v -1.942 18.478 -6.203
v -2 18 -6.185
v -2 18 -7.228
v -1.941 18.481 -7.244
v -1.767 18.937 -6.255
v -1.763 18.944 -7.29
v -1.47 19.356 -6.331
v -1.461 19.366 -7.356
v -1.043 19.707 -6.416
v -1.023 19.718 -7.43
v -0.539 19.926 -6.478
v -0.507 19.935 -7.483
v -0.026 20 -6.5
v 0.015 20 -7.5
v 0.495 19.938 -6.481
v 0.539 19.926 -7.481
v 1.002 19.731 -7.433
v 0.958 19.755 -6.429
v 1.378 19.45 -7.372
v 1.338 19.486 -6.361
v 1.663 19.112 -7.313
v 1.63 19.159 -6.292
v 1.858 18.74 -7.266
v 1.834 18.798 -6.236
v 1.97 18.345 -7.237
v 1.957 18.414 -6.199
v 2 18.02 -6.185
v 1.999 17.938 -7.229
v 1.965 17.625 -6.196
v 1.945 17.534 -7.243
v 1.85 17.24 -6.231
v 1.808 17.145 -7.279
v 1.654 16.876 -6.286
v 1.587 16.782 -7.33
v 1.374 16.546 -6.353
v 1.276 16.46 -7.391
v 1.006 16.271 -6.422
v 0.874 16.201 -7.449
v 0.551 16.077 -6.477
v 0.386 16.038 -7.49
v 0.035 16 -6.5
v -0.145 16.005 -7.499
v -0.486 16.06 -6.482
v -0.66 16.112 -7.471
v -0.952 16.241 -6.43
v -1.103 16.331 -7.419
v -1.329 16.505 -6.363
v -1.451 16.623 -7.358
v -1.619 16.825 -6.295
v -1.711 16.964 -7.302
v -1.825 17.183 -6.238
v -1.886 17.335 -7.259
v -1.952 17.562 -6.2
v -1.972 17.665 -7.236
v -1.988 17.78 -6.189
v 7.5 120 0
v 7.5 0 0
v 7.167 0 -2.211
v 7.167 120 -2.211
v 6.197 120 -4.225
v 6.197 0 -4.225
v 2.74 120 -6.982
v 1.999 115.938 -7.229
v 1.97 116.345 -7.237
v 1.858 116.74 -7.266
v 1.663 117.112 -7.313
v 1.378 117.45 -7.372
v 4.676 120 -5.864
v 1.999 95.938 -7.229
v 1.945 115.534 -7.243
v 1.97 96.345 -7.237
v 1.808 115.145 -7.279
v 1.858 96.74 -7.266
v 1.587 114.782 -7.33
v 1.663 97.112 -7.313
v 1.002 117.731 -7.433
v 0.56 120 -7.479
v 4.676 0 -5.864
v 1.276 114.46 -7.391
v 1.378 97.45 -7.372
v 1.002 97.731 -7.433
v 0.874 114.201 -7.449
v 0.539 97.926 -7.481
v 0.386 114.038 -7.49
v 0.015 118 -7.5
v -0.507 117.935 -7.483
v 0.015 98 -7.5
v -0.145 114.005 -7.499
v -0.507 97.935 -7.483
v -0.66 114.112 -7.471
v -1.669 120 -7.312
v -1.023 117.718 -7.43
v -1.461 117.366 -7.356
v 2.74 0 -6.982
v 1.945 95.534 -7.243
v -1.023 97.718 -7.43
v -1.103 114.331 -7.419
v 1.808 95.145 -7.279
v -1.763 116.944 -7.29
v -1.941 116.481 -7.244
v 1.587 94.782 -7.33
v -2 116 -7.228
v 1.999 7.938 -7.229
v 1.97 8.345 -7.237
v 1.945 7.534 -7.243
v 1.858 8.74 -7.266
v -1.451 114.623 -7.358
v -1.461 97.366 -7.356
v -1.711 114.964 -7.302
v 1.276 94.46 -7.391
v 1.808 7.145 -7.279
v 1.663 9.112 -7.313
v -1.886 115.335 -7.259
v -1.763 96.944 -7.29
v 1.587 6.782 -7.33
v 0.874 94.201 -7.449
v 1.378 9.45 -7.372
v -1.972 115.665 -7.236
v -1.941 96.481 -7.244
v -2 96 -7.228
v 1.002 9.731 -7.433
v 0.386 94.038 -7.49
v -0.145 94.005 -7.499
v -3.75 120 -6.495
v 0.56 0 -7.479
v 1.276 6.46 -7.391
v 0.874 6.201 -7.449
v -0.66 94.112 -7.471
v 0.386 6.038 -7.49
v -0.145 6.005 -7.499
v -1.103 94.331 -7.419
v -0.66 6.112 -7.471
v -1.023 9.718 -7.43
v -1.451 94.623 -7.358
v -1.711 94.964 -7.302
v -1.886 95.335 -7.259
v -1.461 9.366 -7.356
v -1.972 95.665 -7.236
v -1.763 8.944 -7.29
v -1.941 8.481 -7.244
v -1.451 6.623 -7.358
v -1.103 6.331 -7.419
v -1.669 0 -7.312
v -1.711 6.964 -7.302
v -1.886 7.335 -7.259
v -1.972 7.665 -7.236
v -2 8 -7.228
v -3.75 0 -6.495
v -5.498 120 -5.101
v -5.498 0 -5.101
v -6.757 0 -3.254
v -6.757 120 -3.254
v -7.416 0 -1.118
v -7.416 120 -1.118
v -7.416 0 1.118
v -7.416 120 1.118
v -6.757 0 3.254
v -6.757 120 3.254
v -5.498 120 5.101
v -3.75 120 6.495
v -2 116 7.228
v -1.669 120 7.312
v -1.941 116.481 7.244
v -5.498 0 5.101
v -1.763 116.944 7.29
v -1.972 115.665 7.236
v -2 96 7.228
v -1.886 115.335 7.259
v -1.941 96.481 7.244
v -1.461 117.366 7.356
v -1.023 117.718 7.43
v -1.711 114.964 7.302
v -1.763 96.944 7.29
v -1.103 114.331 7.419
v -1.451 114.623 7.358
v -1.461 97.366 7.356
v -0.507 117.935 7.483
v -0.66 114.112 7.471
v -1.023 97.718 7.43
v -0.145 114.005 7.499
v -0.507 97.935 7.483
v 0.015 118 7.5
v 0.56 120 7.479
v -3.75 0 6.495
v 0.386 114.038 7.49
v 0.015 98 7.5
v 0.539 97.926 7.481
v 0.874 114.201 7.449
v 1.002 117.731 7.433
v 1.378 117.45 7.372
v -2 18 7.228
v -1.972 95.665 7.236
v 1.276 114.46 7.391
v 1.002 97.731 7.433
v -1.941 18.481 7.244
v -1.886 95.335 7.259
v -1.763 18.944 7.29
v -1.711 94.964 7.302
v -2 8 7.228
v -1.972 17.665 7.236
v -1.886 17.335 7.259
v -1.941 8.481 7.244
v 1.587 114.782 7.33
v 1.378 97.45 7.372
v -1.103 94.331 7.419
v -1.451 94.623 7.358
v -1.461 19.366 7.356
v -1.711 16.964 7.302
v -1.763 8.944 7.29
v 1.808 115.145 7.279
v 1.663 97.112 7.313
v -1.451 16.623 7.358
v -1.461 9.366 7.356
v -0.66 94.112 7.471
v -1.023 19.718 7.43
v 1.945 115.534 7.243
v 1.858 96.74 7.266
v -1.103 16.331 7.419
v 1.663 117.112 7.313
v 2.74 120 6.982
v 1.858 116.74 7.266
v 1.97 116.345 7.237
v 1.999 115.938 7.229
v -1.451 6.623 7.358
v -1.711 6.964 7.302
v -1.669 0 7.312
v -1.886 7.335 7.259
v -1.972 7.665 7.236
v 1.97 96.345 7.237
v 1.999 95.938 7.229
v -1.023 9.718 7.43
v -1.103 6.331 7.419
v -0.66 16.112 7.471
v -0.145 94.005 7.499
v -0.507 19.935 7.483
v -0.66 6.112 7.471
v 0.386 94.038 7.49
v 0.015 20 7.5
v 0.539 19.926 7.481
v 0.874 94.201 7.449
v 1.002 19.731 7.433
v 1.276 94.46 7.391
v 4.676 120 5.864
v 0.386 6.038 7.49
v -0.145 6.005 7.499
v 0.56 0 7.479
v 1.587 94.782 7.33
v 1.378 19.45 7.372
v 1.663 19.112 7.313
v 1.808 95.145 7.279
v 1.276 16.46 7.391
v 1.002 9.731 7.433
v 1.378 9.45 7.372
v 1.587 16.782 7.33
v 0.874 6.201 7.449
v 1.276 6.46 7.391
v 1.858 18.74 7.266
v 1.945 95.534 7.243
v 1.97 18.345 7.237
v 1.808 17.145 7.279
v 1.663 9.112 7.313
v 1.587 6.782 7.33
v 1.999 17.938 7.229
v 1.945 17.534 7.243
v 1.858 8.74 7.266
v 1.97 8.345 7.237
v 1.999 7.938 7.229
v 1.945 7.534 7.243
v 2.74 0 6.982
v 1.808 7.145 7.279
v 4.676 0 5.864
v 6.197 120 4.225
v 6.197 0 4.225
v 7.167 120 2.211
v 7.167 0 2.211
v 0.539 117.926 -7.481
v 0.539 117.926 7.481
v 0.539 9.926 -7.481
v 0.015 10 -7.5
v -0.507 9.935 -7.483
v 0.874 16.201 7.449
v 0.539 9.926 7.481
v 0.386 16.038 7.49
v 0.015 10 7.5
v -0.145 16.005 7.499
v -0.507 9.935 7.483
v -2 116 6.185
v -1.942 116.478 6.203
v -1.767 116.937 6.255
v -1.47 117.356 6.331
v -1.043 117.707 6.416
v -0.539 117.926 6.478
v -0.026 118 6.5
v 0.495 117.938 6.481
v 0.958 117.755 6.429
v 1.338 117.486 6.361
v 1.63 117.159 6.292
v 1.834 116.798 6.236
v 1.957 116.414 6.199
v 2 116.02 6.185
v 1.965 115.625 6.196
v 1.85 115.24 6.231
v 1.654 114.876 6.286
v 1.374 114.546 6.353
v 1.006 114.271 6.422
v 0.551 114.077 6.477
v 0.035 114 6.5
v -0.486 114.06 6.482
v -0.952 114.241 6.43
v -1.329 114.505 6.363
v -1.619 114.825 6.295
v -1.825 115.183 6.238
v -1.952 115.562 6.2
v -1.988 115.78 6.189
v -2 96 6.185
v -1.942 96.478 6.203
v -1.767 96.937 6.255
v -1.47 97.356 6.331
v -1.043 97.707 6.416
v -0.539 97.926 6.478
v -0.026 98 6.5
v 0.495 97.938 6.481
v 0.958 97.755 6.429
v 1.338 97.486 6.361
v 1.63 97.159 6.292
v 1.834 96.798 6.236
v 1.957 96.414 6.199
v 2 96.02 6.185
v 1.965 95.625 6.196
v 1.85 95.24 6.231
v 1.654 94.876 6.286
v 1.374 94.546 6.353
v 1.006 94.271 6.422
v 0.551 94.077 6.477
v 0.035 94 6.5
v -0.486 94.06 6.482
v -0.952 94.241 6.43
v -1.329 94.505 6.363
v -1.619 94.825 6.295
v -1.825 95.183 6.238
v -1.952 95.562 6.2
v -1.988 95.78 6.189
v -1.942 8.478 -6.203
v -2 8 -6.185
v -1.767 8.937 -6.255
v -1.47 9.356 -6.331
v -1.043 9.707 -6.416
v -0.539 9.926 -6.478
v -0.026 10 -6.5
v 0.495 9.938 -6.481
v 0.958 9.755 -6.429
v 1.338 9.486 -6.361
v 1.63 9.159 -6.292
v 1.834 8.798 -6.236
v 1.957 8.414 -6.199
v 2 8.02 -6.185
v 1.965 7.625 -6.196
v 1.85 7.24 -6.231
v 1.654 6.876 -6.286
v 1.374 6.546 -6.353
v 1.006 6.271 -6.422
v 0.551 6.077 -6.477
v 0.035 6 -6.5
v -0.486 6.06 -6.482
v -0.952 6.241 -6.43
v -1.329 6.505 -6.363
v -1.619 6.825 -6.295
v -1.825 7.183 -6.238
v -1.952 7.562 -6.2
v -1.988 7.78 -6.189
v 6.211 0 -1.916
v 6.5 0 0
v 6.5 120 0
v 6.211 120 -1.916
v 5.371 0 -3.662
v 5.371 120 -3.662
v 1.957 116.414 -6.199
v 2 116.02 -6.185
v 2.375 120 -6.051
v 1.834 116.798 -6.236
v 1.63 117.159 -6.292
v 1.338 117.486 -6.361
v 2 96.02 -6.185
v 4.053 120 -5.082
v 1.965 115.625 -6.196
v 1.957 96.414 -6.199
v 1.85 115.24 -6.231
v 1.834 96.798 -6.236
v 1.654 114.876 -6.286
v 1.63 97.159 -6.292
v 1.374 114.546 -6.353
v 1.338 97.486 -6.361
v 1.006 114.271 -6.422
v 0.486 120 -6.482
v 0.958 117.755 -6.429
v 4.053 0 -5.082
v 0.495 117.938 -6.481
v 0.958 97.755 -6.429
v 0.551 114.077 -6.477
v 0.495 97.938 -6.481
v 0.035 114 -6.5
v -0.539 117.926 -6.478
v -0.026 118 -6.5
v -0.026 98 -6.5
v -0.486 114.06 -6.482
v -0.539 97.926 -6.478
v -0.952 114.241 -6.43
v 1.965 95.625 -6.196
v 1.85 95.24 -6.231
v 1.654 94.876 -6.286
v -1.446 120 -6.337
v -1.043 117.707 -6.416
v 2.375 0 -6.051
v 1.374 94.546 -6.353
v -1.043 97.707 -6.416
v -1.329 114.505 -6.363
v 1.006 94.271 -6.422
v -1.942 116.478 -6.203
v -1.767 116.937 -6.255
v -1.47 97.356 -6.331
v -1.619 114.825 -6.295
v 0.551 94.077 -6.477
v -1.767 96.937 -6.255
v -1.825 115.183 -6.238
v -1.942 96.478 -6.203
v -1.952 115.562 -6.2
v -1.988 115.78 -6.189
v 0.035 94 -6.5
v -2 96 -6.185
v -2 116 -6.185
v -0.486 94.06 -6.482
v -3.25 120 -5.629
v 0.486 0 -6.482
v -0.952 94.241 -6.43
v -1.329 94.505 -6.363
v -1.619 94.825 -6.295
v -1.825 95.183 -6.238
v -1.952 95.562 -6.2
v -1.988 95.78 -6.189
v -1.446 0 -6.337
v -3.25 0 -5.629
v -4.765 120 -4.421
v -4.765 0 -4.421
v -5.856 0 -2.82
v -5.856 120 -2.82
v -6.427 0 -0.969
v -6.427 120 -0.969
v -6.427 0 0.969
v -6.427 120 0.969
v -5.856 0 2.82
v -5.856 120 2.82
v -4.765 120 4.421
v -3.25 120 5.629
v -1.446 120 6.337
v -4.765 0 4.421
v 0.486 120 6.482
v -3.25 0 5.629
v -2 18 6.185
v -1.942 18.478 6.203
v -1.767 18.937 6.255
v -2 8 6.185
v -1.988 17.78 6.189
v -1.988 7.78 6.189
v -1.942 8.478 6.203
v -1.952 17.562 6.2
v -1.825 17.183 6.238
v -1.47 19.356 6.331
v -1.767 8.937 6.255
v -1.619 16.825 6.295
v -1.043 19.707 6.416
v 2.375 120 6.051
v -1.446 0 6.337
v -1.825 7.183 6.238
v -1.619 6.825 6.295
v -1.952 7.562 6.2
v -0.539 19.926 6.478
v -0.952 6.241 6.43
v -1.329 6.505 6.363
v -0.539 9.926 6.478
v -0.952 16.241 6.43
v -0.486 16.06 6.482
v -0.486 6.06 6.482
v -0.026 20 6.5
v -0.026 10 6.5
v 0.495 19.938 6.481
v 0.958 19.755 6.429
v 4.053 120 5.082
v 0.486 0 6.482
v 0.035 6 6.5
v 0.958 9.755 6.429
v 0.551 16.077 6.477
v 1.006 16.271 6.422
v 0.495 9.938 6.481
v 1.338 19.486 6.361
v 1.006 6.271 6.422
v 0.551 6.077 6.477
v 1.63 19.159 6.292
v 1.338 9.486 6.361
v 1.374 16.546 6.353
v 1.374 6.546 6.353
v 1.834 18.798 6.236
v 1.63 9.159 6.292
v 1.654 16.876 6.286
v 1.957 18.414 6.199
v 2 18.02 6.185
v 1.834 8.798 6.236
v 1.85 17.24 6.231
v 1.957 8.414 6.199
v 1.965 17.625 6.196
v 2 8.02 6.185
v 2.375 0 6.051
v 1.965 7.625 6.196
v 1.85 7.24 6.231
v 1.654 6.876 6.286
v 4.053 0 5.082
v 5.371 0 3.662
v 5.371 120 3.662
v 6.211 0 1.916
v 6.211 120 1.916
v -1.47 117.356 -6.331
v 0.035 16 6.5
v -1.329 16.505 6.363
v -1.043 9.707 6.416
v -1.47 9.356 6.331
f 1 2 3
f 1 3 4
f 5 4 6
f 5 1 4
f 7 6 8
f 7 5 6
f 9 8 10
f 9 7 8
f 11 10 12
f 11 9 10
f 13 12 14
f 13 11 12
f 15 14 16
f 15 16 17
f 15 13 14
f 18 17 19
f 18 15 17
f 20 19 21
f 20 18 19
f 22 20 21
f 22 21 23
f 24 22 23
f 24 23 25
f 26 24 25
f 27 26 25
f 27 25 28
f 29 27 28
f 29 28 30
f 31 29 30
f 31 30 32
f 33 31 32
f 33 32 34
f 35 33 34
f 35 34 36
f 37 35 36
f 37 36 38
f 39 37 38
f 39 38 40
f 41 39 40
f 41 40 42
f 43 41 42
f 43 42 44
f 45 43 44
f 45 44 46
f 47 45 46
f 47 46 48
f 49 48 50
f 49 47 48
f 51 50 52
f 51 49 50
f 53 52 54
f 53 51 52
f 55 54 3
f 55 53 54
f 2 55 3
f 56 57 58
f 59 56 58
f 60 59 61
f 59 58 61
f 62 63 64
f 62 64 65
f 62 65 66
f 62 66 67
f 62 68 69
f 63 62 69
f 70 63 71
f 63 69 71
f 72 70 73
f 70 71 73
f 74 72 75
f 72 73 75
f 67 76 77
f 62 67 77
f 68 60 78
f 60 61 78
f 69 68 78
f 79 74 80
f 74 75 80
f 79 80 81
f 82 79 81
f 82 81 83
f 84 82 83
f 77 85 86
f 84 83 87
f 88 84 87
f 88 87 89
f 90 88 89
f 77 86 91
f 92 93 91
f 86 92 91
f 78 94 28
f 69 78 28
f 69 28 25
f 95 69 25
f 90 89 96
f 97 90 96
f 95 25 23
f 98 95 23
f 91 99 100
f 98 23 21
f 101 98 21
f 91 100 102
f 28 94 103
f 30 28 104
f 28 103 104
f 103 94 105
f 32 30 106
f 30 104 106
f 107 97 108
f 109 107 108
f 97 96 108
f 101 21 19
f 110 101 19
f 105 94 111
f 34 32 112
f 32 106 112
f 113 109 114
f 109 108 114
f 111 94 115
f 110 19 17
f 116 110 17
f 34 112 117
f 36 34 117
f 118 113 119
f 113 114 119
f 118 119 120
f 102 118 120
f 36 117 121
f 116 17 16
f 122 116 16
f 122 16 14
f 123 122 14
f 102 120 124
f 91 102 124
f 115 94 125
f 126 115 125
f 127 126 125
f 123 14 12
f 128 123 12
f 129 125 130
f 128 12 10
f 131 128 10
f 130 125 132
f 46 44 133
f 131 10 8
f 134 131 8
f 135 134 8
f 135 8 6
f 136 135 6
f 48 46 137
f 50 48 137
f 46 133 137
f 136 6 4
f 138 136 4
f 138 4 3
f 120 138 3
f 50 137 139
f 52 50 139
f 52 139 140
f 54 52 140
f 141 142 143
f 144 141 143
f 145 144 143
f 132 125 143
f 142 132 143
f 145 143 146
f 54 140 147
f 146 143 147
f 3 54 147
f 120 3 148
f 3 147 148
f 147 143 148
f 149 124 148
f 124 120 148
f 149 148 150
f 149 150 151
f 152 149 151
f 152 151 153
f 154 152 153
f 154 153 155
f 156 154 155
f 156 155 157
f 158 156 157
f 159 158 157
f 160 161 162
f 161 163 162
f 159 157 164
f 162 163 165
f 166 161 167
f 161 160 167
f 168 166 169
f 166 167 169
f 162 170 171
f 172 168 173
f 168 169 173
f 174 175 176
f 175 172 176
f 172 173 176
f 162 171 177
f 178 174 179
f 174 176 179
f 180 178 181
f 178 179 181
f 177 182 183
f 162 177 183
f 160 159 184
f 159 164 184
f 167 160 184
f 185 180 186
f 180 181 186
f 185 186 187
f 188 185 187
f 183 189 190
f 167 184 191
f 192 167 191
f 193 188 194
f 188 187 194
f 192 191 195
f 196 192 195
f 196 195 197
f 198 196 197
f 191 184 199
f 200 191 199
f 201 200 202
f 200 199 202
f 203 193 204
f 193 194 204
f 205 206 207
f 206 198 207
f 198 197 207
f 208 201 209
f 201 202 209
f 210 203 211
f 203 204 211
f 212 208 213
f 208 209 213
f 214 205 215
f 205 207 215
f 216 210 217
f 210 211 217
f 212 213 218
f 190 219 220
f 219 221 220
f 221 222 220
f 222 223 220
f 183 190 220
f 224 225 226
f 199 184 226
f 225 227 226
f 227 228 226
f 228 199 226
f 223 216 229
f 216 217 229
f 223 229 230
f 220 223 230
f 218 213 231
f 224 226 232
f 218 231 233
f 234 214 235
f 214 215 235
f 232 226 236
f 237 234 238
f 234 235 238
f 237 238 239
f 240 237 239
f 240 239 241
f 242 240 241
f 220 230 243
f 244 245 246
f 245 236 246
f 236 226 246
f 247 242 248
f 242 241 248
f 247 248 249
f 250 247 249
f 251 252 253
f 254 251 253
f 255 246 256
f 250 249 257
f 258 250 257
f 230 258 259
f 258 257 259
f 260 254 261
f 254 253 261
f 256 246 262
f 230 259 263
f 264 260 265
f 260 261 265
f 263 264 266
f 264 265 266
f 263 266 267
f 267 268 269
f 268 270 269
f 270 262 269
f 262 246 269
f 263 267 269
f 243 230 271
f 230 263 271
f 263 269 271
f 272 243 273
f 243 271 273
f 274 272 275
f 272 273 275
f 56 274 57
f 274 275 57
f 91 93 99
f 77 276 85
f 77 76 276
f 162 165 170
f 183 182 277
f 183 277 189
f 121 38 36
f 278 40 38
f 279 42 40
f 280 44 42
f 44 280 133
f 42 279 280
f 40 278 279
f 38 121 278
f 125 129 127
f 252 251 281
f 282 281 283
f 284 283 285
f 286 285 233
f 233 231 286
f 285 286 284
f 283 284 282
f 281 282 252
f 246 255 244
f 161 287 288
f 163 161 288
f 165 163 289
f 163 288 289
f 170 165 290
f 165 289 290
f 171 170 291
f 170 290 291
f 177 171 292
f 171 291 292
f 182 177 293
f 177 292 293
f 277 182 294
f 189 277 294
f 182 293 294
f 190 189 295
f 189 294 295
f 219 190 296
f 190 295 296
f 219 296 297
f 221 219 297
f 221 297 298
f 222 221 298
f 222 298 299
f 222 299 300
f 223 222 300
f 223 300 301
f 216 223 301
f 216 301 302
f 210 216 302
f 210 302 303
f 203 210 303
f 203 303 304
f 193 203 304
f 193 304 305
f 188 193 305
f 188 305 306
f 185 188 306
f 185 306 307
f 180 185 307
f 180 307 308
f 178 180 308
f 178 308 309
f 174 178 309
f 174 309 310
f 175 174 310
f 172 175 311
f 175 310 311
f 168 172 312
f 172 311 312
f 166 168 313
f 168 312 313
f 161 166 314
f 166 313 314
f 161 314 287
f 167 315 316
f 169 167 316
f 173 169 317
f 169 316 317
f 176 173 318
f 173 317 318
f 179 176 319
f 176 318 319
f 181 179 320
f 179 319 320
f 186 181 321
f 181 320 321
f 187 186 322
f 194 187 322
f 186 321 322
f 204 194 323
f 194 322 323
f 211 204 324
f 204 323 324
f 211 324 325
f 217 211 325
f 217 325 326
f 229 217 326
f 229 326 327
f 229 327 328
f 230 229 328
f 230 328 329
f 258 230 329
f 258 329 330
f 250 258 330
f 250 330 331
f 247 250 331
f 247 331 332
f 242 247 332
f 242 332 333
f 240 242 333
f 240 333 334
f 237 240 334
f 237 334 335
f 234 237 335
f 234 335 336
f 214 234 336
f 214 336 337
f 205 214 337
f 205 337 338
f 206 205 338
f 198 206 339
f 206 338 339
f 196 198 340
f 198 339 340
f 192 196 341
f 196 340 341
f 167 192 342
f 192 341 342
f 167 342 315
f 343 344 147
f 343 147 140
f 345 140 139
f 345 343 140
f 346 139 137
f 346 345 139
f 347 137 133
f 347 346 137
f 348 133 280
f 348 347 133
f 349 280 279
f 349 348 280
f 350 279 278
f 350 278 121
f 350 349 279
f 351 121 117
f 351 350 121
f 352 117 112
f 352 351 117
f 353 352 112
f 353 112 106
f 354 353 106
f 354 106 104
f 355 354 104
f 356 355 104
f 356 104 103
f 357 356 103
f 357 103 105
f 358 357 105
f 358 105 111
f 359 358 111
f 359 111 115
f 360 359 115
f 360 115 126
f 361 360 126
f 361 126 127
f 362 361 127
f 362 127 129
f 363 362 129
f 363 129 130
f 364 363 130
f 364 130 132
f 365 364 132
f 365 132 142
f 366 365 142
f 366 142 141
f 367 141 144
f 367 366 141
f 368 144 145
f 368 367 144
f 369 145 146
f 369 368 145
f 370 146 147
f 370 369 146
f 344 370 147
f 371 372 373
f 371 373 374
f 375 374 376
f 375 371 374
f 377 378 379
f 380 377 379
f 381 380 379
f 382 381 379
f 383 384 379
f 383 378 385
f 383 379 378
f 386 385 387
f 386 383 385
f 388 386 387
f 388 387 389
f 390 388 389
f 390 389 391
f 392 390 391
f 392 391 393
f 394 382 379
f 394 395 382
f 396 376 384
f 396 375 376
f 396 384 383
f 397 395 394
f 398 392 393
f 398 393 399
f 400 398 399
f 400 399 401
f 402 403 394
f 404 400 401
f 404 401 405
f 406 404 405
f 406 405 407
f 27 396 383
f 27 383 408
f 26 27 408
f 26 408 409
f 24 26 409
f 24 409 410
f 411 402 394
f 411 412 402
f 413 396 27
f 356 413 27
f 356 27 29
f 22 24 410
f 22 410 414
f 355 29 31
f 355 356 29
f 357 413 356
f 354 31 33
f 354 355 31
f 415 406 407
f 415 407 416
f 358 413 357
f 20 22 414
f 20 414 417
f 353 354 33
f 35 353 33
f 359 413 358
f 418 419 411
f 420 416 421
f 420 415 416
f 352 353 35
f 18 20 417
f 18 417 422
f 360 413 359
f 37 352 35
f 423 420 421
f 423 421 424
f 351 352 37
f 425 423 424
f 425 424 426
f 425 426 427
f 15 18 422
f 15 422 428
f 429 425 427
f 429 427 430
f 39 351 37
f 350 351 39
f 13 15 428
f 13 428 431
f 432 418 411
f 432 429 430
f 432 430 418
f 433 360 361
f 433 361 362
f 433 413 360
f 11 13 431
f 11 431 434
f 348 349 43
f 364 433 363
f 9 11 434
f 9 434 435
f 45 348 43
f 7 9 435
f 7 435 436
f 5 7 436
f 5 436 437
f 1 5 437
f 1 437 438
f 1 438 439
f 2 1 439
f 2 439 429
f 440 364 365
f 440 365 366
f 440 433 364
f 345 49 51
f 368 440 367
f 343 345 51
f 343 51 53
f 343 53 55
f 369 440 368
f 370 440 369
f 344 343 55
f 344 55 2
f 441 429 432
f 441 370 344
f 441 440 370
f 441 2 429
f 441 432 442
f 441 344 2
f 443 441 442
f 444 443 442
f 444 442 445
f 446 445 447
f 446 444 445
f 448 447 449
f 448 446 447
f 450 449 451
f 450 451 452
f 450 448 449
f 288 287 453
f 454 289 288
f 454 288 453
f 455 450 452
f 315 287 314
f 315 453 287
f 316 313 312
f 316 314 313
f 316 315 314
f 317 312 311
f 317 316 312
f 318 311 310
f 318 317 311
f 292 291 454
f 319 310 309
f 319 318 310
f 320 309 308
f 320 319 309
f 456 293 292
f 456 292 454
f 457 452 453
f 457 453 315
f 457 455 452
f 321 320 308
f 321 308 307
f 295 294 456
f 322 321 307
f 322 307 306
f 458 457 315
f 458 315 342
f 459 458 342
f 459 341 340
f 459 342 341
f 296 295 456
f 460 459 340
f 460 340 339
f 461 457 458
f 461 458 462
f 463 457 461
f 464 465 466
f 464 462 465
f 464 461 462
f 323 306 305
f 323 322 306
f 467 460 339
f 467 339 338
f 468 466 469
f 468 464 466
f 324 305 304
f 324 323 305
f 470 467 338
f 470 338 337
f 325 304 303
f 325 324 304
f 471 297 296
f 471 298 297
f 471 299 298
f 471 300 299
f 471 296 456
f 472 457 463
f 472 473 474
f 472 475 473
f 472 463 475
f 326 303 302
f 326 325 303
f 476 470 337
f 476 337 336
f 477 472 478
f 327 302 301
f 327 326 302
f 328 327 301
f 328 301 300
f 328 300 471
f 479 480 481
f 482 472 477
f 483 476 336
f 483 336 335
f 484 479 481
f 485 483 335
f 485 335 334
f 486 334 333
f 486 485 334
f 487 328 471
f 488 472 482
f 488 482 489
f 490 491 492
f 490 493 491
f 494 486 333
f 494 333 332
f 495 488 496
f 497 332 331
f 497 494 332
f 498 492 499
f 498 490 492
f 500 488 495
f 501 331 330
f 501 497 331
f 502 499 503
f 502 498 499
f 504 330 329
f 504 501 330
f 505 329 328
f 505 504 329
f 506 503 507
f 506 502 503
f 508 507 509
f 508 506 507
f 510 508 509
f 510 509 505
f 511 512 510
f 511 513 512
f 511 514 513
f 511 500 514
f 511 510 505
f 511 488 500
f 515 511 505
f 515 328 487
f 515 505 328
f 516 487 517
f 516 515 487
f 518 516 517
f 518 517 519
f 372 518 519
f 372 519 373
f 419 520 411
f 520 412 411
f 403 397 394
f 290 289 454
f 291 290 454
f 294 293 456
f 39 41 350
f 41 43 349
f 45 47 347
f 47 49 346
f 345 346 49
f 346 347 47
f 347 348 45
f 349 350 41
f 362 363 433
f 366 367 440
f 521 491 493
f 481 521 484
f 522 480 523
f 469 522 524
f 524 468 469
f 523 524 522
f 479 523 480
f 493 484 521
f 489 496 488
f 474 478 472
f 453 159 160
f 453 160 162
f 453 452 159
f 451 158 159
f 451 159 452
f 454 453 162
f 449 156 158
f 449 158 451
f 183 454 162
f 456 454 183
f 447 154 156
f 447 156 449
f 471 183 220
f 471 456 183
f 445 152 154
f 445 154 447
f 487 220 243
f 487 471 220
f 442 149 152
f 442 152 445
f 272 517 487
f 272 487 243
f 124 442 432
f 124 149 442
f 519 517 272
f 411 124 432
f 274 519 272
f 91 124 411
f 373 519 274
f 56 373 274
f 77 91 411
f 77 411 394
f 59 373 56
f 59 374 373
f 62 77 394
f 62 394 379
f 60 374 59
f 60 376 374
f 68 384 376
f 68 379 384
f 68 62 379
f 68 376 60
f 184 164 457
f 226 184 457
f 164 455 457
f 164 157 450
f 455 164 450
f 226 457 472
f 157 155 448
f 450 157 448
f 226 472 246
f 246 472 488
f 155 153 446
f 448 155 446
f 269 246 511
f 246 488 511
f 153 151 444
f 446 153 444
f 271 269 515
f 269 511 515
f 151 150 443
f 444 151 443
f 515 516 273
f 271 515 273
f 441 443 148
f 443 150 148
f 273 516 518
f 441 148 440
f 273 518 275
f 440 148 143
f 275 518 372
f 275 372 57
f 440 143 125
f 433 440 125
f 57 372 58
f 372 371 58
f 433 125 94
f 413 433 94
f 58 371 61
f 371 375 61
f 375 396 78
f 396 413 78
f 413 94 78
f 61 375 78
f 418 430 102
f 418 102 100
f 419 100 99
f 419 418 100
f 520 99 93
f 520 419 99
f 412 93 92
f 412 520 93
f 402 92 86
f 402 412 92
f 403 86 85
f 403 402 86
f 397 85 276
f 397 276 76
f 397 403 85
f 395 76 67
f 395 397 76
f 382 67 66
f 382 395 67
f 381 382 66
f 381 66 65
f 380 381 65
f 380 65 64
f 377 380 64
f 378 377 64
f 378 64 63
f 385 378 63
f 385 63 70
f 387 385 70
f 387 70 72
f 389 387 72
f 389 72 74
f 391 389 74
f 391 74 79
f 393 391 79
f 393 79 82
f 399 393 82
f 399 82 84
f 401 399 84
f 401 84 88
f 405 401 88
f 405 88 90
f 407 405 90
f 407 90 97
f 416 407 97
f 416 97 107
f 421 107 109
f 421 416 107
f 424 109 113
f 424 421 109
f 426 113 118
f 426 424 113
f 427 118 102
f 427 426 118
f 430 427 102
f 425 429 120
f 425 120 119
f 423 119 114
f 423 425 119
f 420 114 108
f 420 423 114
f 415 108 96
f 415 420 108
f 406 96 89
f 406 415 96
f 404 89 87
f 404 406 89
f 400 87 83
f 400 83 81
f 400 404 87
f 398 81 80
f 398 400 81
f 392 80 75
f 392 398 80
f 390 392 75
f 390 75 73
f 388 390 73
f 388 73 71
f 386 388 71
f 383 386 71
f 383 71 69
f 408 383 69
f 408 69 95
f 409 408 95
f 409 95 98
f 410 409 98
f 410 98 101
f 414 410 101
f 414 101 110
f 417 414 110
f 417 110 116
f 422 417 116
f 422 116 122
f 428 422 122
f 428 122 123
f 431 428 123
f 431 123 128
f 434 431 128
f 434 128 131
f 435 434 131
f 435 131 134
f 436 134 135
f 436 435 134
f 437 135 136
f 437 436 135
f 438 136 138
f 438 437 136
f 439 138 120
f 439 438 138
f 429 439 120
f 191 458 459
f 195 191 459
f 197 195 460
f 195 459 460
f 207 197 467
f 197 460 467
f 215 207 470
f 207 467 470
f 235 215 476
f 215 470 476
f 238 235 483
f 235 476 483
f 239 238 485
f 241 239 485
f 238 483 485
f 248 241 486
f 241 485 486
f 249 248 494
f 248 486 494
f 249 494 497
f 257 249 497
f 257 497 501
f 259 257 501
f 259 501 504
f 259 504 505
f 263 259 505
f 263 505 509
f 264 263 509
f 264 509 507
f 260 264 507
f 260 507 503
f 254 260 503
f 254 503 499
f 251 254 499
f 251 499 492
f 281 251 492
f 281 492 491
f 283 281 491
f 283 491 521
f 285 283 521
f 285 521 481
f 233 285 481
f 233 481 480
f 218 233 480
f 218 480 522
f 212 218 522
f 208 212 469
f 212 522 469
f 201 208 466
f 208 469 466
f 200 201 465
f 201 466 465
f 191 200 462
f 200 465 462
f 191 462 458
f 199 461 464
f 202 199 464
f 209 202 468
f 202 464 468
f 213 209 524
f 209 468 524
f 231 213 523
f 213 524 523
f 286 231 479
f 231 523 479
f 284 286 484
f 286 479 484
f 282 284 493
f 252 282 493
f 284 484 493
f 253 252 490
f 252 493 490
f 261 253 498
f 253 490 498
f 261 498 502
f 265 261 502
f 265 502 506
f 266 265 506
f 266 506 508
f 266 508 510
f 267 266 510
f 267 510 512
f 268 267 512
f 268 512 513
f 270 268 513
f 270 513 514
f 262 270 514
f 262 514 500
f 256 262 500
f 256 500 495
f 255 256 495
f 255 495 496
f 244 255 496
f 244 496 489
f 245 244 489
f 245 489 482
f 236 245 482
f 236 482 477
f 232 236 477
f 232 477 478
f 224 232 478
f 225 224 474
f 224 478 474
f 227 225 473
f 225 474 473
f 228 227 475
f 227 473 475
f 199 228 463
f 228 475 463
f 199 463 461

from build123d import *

# Parameters (mm, degrees)
SKETCH1_R               = 7.5
SKETCH1_R_2             = 6.5
BOSS_EXTRUDE1_DEPTH     = 120
SKETCH3_R               = 2
CUT_EXTRUDE1_DEPTH      = 8.5
CUT_EXTRUDE1_DEPTH_BACK = 8.5


with BuildPart() as part:
    # Sketch1 → Boss-Extrude1 (new body)
    with BuildSketch(Plane(origin=(0, 0, 0), x_dir=(1, 0, 0), z_dir=(0, 1, 0))):
        Circle(SKETCH1_R)
        Circle(SKETCH1_R_2, mode=Mode.SUBTRACT)
    extrude(amount=BOSS_EXTRUDE1_DEPTH)

    # Sketch3 → Cut-Extrude1 (cut, two sides)
    with BuildSketch(Plane(origin=(0, 0, 0), x_dir=(-1, 0, 0), z_dir=(0, 0, -1))) as cut_extrude1_sk:
        with Locations((0, 116)):
            Circle(SKETCH3_R)
        with Locations((0, 96)):
            Circle(SKETCH3_R)
        with Locations((0, 8)):
            Circle(SKETCH3_R)
        with Locations((0, 18)):
            Circle(SKETCH3_R)
    extrude(amount=CUT_EXTRUDE1_DEPTH, mode=Mode.SUBTRACT)
    extrude(cut_extrude1_sk.sketch, amount=-CUT_EXTRUDE1_DEPTH_BACK, mode=Mode.SUBTRACT)


solid = part.part
